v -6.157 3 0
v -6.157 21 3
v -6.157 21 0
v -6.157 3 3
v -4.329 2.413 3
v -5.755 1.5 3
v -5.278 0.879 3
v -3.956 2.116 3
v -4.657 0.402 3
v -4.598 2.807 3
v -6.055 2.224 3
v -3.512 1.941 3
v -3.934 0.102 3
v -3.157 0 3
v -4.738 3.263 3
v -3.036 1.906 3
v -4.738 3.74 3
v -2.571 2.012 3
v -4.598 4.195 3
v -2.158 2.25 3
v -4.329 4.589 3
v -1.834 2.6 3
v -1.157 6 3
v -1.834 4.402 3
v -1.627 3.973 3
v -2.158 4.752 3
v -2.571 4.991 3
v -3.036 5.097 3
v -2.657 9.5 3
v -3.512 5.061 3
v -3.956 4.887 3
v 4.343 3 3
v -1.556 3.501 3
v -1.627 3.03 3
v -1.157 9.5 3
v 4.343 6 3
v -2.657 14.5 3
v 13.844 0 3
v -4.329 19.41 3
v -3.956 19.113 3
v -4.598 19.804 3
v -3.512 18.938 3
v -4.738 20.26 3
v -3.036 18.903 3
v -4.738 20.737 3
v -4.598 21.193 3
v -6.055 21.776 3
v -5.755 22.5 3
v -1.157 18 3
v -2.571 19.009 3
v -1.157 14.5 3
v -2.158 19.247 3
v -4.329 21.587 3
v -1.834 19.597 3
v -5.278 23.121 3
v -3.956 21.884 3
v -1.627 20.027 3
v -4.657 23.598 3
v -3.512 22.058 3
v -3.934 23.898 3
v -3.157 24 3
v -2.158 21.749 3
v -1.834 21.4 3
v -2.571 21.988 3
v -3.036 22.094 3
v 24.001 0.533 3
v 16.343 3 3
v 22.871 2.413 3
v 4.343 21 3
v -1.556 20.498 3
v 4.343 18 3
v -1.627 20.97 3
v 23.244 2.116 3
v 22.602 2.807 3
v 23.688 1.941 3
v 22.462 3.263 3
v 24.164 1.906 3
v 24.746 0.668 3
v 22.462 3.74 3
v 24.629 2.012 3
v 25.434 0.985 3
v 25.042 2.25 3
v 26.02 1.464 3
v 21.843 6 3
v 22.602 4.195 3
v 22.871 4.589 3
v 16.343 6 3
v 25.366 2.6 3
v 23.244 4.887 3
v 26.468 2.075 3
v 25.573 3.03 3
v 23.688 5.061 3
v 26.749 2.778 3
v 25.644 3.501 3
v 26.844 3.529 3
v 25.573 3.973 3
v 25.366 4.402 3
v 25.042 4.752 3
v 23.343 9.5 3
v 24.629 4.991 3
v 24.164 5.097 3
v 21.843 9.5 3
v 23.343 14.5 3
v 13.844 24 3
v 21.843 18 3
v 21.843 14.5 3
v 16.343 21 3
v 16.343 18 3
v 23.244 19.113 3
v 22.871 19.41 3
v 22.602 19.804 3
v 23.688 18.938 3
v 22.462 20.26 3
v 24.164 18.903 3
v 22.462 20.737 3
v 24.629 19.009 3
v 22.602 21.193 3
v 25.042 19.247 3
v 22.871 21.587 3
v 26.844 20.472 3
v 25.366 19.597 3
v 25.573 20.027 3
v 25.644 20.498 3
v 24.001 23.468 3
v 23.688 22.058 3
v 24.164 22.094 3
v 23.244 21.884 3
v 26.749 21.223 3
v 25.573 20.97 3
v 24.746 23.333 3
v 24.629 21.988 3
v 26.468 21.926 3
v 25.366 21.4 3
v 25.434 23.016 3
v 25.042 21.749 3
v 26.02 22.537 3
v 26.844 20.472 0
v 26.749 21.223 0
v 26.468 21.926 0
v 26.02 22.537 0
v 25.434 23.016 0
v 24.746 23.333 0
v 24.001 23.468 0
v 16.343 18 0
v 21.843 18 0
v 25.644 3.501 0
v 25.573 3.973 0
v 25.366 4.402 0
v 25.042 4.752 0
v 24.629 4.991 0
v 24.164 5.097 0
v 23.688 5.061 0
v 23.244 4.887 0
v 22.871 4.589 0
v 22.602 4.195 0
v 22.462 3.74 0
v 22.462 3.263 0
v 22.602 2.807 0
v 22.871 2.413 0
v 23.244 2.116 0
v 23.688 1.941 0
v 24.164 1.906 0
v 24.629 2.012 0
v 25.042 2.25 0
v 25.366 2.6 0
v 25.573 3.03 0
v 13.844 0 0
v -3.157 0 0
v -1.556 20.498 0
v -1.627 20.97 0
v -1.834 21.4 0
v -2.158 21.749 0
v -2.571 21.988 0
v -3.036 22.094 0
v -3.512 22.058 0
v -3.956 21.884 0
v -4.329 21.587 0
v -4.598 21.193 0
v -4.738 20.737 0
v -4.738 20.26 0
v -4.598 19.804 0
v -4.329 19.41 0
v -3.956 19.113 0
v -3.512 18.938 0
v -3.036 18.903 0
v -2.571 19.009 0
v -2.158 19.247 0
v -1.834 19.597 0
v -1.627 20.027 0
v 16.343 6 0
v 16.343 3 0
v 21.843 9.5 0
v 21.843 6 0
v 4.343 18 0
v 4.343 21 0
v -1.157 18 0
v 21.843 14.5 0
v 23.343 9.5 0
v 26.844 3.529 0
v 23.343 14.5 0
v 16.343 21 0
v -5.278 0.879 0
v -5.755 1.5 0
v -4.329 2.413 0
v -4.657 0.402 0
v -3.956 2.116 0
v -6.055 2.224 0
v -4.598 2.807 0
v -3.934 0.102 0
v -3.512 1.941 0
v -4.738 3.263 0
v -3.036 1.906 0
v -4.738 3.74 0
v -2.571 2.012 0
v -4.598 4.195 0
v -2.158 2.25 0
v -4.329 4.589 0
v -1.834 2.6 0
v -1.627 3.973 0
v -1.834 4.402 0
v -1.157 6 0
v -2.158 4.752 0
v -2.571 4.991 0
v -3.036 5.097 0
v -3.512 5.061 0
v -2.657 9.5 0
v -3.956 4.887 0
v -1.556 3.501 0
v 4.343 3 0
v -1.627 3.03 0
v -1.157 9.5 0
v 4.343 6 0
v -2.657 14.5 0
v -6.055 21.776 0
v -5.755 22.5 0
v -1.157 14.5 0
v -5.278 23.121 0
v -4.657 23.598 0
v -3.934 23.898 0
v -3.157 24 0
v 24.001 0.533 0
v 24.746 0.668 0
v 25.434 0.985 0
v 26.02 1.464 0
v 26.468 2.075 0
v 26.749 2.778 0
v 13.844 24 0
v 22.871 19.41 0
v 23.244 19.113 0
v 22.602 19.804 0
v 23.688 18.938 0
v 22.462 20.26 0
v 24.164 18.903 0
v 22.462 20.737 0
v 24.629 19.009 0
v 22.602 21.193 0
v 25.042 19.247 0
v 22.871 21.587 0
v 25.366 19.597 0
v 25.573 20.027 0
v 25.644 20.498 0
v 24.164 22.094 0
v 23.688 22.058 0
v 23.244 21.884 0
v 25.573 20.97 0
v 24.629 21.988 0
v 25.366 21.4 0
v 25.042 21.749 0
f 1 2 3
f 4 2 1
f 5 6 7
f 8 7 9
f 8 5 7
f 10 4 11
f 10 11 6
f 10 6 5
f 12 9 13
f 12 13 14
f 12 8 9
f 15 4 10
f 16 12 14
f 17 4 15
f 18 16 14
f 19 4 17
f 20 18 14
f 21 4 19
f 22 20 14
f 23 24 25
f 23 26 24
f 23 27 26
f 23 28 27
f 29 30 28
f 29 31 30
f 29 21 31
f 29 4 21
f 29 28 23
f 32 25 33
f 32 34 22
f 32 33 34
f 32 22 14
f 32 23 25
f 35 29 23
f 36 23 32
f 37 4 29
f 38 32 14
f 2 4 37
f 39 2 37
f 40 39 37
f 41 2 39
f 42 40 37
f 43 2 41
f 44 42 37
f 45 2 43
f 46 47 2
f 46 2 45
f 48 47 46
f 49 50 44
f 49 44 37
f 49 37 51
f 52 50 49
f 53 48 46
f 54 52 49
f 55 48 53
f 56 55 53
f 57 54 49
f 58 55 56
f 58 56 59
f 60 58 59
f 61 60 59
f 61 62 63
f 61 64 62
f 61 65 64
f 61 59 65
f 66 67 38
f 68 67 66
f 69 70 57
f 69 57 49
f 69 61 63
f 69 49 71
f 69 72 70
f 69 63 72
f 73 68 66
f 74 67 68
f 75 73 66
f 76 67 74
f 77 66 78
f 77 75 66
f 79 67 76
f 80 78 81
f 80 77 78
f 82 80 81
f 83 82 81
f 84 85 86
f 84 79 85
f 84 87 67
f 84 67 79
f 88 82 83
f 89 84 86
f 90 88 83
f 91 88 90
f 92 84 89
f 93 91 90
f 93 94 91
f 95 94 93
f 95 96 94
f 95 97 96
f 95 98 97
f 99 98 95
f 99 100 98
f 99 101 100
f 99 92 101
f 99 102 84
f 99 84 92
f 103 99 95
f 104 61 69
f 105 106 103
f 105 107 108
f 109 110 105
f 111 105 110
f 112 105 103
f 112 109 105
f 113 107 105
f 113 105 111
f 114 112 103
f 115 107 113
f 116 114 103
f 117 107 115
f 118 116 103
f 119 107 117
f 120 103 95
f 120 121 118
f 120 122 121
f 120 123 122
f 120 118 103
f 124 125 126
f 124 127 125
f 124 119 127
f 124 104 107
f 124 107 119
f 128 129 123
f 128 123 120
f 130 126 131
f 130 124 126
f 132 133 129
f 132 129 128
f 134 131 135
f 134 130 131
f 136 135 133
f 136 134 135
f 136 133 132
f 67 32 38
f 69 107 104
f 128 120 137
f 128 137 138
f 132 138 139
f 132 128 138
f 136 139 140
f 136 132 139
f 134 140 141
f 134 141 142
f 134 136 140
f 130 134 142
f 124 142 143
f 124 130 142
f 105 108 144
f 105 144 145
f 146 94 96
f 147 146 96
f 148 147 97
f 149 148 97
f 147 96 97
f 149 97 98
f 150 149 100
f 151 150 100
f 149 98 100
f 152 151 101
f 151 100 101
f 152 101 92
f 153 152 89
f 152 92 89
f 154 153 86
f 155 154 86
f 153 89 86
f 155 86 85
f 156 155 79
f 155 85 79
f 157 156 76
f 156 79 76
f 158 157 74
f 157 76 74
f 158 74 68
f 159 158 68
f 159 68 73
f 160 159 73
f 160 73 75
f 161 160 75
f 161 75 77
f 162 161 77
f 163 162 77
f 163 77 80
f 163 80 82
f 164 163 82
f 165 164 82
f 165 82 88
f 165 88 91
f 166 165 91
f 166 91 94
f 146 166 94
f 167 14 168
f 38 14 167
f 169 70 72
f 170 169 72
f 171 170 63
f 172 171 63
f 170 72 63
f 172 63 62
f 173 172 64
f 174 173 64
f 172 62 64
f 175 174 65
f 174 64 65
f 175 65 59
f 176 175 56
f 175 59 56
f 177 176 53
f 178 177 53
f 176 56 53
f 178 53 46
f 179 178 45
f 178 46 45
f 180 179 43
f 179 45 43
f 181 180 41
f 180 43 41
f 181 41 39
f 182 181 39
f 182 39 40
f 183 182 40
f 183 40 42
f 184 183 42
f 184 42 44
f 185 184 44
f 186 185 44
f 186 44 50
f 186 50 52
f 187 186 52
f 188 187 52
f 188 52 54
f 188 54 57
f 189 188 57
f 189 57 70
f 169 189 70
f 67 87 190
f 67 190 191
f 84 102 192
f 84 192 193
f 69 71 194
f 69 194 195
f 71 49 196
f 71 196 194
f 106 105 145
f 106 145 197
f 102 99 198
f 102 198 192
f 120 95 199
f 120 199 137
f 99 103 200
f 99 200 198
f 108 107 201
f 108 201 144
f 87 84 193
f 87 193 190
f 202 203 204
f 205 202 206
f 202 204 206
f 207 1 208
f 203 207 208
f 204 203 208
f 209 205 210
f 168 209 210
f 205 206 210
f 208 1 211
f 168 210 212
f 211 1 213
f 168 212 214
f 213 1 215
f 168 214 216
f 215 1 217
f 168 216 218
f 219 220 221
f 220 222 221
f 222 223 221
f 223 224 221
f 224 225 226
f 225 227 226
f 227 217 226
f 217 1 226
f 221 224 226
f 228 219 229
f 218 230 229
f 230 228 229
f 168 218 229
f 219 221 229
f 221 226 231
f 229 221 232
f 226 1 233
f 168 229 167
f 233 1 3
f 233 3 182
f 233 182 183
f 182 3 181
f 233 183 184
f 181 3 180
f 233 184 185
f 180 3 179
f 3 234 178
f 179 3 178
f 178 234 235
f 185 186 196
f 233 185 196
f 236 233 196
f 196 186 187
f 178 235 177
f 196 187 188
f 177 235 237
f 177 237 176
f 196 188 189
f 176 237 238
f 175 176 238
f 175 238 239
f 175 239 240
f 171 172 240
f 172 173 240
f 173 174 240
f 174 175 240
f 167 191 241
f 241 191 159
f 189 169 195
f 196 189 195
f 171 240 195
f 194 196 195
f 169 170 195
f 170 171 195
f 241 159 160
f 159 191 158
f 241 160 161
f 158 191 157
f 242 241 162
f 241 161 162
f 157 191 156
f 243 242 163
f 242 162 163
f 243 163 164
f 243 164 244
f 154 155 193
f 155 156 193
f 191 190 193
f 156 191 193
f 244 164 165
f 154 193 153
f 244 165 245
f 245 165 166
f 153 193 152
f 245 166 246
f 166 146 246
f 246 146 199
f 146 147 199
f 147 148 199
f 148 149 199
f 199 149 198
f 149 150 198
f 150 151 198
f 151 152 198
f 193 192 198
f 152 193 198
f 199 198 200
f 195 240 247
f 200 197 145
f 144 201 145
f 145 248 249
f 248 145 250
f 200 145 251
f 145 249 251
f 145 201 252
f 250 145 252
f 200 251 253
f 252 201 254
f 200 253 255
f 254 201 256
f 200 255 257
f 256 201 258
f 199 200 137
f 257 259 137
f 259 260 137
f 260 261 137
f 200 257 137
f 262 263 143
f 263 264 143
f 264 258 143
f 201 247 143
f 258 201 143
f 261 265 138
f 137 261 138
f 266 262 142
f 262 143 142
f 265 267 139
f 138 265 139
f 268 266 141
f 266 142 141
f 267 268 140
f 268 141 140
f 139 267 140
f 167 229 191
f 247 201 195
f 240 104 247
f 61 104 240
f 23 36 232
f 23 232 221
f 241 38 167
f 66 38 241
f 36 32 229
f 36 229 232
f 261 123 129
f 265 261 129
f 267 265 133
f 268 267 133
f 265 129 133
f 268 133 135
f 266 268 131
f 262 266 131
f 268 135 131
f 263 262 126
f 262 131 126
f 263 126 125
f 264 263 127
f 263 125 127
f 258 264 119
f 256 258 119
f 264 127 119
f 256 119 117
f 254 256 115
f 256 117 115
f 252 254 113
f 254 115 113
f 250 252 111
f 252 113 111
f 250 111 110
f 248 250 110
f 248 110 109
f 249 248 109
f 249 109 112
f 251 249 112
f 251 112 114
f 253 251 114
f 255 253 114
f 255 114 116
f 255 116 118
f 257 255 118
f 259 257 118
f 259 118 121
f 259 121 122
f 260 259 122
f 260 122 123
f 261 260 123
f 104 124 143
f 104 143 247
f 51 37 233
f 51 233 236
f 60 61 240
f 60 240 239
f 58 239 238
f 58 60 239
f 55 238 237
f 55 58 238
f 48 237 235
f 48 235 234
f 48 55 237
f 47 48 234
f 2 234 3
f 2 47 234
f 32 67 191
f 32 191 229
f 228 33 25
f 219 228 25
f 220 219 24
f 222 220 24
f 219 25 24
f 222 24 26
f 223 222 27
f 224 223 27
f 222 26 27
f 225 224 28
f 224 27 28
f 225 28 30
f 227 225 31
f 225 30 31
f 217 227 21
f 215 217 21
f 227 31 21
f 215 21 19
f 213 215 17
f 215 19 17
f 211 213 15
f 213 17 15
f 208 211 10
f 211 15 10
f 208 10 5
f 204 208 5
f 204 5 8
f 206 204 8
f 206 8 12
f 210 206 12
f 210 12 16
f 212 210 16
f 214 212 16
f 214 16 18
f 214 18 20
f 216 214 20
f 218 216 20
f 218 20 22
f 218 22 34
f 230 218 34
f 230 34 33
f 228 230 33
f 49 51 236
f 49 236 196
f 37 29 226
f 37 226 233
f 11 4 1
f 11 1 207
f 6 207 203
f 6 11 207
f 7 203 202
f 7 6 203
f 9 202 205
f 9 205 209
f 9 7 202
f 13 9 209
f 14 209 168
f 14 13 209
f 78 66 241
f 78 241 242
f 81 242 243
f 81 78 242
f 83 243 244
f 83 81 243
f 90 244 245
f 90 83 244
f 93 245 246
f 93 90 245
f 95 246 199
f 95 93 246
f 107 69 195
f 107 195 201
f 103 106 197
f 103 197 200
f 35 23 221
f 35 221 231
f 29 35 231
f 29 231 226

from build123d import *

# Parameters (mm, degrees)
SKETCH_1_R          = 1.35
SKETCH_1_R_2        = 1
EXTRUDE_1_DEPTH     = 3
SKETCH_2_R          = 1.6
CUT_EXTRUDE_1_DEPTH = 37.133094234


with BuildPart() as part:
    # 草图1 → 凸台-拉伸1 (new body)
    with BuildSketch(Plane.XY.offset(3)):
        with BuildLine():
            Line((13.843681844, 23.9998), (-3.157118156, 23.9998))
            ThreePointArc((-3.157118156, 23.9998), (-5.2784385, 23.121120344), (-6.157118156, 20.9998))
            Line((-6.157118156, 20.9998), (-6.157118156, 3))
            ThreePointArc((-6.157118156, 3), (-5.2784385, 0.878679656), (-3.157118156, 0))
            Line((-3.157118156, 0), (13.843681844, 0))
            Line((13.843681844, 0), (24.001386189, 0.533010723))
            ThreePointArc((24.001386189, 0.533010723), (26.020372671, 1.463896655), (26.844181844, 3.528889024))
            Line((26.844181844, 3.528889024), (26.844181844, 20.471910982))
            ThreePointArc((26.844181844, 20.471910982), (26.020271299, 22.537010177), (24.001092054, 23.467804703))
            Line((24.001092054, 23.467804703), (13.843681844, 23.9998))
        make_face()
        with Locations(Location((24.044031844, 3.501148349, 0), (0, 0, 180))):
            Circle(SKETCH_1_R, mode=Mode.SUBTRACT)
        with Locations(Location((-3.156018156, 3.501148349, 0), (0, 0, 180))):
            Circle(SKETCH_1_R, mode=Mode.SUBTRACT)
        with Locations(Location((24.044031844, 20.498351651, 0), (0, 0, 180))):
            Circle(SKETCH_1_R, mode=Mode.SUBTRACT)
        with Locations(Location((-3.156018156, 20.498351651, 0), (0, 0, 180))):
            Circle(SKETCH_1_R_2, mode=Mode.SUBTRACT)
        Polygon((21.843181844, 14.4995), (23.343481844, 14.4995), (23.343481844, 9.5), (21.843181844, 9.5), (21.843181844, 6), (16.343381844, 6), (16.343381844, 3), (4.343381844, 3), (4.343381844, 6), (-1.156518156, 6), (-1.156518156, 9.5), (-2.656818156, 9.5), (-2.656818156, 14.4995), (-1.156518156, 14.4995), (-1.156518156, 17.9998), (4.343381844, 17.9998), (4.343381844, 20.9998), (16.343381844, 20.9998), (16.343381844, 17.9998), (21.843181844, 17.9998), align=None, mode=Mode.SUBTRACT)
    extrude(amount=-EXTRUDE_1_DEPTH)

    # 草图2 → 切除-拉伸1 (cut, through all)
    with BuildSketch(Plane.XY.offset(3)):
        with Locations((-3.156018156, 20.498351651)):
            Circle(SKETCH_2_R)
        with Locations((24.044031844, 20.498351651)):
            Circle(SKETCH_2_R)
        with Locations((24.044031844, 3.501148349)):
            Circle(SKETCH_2_R)
        with Locations((-3.156018156, 3.501148349)):
            Circle(SKETCH_2_R)
    extrude(amount=-CUT_EXTRUDE_1_DEPTH, mode=Mode.SUBTRACT)


solid = part.part
